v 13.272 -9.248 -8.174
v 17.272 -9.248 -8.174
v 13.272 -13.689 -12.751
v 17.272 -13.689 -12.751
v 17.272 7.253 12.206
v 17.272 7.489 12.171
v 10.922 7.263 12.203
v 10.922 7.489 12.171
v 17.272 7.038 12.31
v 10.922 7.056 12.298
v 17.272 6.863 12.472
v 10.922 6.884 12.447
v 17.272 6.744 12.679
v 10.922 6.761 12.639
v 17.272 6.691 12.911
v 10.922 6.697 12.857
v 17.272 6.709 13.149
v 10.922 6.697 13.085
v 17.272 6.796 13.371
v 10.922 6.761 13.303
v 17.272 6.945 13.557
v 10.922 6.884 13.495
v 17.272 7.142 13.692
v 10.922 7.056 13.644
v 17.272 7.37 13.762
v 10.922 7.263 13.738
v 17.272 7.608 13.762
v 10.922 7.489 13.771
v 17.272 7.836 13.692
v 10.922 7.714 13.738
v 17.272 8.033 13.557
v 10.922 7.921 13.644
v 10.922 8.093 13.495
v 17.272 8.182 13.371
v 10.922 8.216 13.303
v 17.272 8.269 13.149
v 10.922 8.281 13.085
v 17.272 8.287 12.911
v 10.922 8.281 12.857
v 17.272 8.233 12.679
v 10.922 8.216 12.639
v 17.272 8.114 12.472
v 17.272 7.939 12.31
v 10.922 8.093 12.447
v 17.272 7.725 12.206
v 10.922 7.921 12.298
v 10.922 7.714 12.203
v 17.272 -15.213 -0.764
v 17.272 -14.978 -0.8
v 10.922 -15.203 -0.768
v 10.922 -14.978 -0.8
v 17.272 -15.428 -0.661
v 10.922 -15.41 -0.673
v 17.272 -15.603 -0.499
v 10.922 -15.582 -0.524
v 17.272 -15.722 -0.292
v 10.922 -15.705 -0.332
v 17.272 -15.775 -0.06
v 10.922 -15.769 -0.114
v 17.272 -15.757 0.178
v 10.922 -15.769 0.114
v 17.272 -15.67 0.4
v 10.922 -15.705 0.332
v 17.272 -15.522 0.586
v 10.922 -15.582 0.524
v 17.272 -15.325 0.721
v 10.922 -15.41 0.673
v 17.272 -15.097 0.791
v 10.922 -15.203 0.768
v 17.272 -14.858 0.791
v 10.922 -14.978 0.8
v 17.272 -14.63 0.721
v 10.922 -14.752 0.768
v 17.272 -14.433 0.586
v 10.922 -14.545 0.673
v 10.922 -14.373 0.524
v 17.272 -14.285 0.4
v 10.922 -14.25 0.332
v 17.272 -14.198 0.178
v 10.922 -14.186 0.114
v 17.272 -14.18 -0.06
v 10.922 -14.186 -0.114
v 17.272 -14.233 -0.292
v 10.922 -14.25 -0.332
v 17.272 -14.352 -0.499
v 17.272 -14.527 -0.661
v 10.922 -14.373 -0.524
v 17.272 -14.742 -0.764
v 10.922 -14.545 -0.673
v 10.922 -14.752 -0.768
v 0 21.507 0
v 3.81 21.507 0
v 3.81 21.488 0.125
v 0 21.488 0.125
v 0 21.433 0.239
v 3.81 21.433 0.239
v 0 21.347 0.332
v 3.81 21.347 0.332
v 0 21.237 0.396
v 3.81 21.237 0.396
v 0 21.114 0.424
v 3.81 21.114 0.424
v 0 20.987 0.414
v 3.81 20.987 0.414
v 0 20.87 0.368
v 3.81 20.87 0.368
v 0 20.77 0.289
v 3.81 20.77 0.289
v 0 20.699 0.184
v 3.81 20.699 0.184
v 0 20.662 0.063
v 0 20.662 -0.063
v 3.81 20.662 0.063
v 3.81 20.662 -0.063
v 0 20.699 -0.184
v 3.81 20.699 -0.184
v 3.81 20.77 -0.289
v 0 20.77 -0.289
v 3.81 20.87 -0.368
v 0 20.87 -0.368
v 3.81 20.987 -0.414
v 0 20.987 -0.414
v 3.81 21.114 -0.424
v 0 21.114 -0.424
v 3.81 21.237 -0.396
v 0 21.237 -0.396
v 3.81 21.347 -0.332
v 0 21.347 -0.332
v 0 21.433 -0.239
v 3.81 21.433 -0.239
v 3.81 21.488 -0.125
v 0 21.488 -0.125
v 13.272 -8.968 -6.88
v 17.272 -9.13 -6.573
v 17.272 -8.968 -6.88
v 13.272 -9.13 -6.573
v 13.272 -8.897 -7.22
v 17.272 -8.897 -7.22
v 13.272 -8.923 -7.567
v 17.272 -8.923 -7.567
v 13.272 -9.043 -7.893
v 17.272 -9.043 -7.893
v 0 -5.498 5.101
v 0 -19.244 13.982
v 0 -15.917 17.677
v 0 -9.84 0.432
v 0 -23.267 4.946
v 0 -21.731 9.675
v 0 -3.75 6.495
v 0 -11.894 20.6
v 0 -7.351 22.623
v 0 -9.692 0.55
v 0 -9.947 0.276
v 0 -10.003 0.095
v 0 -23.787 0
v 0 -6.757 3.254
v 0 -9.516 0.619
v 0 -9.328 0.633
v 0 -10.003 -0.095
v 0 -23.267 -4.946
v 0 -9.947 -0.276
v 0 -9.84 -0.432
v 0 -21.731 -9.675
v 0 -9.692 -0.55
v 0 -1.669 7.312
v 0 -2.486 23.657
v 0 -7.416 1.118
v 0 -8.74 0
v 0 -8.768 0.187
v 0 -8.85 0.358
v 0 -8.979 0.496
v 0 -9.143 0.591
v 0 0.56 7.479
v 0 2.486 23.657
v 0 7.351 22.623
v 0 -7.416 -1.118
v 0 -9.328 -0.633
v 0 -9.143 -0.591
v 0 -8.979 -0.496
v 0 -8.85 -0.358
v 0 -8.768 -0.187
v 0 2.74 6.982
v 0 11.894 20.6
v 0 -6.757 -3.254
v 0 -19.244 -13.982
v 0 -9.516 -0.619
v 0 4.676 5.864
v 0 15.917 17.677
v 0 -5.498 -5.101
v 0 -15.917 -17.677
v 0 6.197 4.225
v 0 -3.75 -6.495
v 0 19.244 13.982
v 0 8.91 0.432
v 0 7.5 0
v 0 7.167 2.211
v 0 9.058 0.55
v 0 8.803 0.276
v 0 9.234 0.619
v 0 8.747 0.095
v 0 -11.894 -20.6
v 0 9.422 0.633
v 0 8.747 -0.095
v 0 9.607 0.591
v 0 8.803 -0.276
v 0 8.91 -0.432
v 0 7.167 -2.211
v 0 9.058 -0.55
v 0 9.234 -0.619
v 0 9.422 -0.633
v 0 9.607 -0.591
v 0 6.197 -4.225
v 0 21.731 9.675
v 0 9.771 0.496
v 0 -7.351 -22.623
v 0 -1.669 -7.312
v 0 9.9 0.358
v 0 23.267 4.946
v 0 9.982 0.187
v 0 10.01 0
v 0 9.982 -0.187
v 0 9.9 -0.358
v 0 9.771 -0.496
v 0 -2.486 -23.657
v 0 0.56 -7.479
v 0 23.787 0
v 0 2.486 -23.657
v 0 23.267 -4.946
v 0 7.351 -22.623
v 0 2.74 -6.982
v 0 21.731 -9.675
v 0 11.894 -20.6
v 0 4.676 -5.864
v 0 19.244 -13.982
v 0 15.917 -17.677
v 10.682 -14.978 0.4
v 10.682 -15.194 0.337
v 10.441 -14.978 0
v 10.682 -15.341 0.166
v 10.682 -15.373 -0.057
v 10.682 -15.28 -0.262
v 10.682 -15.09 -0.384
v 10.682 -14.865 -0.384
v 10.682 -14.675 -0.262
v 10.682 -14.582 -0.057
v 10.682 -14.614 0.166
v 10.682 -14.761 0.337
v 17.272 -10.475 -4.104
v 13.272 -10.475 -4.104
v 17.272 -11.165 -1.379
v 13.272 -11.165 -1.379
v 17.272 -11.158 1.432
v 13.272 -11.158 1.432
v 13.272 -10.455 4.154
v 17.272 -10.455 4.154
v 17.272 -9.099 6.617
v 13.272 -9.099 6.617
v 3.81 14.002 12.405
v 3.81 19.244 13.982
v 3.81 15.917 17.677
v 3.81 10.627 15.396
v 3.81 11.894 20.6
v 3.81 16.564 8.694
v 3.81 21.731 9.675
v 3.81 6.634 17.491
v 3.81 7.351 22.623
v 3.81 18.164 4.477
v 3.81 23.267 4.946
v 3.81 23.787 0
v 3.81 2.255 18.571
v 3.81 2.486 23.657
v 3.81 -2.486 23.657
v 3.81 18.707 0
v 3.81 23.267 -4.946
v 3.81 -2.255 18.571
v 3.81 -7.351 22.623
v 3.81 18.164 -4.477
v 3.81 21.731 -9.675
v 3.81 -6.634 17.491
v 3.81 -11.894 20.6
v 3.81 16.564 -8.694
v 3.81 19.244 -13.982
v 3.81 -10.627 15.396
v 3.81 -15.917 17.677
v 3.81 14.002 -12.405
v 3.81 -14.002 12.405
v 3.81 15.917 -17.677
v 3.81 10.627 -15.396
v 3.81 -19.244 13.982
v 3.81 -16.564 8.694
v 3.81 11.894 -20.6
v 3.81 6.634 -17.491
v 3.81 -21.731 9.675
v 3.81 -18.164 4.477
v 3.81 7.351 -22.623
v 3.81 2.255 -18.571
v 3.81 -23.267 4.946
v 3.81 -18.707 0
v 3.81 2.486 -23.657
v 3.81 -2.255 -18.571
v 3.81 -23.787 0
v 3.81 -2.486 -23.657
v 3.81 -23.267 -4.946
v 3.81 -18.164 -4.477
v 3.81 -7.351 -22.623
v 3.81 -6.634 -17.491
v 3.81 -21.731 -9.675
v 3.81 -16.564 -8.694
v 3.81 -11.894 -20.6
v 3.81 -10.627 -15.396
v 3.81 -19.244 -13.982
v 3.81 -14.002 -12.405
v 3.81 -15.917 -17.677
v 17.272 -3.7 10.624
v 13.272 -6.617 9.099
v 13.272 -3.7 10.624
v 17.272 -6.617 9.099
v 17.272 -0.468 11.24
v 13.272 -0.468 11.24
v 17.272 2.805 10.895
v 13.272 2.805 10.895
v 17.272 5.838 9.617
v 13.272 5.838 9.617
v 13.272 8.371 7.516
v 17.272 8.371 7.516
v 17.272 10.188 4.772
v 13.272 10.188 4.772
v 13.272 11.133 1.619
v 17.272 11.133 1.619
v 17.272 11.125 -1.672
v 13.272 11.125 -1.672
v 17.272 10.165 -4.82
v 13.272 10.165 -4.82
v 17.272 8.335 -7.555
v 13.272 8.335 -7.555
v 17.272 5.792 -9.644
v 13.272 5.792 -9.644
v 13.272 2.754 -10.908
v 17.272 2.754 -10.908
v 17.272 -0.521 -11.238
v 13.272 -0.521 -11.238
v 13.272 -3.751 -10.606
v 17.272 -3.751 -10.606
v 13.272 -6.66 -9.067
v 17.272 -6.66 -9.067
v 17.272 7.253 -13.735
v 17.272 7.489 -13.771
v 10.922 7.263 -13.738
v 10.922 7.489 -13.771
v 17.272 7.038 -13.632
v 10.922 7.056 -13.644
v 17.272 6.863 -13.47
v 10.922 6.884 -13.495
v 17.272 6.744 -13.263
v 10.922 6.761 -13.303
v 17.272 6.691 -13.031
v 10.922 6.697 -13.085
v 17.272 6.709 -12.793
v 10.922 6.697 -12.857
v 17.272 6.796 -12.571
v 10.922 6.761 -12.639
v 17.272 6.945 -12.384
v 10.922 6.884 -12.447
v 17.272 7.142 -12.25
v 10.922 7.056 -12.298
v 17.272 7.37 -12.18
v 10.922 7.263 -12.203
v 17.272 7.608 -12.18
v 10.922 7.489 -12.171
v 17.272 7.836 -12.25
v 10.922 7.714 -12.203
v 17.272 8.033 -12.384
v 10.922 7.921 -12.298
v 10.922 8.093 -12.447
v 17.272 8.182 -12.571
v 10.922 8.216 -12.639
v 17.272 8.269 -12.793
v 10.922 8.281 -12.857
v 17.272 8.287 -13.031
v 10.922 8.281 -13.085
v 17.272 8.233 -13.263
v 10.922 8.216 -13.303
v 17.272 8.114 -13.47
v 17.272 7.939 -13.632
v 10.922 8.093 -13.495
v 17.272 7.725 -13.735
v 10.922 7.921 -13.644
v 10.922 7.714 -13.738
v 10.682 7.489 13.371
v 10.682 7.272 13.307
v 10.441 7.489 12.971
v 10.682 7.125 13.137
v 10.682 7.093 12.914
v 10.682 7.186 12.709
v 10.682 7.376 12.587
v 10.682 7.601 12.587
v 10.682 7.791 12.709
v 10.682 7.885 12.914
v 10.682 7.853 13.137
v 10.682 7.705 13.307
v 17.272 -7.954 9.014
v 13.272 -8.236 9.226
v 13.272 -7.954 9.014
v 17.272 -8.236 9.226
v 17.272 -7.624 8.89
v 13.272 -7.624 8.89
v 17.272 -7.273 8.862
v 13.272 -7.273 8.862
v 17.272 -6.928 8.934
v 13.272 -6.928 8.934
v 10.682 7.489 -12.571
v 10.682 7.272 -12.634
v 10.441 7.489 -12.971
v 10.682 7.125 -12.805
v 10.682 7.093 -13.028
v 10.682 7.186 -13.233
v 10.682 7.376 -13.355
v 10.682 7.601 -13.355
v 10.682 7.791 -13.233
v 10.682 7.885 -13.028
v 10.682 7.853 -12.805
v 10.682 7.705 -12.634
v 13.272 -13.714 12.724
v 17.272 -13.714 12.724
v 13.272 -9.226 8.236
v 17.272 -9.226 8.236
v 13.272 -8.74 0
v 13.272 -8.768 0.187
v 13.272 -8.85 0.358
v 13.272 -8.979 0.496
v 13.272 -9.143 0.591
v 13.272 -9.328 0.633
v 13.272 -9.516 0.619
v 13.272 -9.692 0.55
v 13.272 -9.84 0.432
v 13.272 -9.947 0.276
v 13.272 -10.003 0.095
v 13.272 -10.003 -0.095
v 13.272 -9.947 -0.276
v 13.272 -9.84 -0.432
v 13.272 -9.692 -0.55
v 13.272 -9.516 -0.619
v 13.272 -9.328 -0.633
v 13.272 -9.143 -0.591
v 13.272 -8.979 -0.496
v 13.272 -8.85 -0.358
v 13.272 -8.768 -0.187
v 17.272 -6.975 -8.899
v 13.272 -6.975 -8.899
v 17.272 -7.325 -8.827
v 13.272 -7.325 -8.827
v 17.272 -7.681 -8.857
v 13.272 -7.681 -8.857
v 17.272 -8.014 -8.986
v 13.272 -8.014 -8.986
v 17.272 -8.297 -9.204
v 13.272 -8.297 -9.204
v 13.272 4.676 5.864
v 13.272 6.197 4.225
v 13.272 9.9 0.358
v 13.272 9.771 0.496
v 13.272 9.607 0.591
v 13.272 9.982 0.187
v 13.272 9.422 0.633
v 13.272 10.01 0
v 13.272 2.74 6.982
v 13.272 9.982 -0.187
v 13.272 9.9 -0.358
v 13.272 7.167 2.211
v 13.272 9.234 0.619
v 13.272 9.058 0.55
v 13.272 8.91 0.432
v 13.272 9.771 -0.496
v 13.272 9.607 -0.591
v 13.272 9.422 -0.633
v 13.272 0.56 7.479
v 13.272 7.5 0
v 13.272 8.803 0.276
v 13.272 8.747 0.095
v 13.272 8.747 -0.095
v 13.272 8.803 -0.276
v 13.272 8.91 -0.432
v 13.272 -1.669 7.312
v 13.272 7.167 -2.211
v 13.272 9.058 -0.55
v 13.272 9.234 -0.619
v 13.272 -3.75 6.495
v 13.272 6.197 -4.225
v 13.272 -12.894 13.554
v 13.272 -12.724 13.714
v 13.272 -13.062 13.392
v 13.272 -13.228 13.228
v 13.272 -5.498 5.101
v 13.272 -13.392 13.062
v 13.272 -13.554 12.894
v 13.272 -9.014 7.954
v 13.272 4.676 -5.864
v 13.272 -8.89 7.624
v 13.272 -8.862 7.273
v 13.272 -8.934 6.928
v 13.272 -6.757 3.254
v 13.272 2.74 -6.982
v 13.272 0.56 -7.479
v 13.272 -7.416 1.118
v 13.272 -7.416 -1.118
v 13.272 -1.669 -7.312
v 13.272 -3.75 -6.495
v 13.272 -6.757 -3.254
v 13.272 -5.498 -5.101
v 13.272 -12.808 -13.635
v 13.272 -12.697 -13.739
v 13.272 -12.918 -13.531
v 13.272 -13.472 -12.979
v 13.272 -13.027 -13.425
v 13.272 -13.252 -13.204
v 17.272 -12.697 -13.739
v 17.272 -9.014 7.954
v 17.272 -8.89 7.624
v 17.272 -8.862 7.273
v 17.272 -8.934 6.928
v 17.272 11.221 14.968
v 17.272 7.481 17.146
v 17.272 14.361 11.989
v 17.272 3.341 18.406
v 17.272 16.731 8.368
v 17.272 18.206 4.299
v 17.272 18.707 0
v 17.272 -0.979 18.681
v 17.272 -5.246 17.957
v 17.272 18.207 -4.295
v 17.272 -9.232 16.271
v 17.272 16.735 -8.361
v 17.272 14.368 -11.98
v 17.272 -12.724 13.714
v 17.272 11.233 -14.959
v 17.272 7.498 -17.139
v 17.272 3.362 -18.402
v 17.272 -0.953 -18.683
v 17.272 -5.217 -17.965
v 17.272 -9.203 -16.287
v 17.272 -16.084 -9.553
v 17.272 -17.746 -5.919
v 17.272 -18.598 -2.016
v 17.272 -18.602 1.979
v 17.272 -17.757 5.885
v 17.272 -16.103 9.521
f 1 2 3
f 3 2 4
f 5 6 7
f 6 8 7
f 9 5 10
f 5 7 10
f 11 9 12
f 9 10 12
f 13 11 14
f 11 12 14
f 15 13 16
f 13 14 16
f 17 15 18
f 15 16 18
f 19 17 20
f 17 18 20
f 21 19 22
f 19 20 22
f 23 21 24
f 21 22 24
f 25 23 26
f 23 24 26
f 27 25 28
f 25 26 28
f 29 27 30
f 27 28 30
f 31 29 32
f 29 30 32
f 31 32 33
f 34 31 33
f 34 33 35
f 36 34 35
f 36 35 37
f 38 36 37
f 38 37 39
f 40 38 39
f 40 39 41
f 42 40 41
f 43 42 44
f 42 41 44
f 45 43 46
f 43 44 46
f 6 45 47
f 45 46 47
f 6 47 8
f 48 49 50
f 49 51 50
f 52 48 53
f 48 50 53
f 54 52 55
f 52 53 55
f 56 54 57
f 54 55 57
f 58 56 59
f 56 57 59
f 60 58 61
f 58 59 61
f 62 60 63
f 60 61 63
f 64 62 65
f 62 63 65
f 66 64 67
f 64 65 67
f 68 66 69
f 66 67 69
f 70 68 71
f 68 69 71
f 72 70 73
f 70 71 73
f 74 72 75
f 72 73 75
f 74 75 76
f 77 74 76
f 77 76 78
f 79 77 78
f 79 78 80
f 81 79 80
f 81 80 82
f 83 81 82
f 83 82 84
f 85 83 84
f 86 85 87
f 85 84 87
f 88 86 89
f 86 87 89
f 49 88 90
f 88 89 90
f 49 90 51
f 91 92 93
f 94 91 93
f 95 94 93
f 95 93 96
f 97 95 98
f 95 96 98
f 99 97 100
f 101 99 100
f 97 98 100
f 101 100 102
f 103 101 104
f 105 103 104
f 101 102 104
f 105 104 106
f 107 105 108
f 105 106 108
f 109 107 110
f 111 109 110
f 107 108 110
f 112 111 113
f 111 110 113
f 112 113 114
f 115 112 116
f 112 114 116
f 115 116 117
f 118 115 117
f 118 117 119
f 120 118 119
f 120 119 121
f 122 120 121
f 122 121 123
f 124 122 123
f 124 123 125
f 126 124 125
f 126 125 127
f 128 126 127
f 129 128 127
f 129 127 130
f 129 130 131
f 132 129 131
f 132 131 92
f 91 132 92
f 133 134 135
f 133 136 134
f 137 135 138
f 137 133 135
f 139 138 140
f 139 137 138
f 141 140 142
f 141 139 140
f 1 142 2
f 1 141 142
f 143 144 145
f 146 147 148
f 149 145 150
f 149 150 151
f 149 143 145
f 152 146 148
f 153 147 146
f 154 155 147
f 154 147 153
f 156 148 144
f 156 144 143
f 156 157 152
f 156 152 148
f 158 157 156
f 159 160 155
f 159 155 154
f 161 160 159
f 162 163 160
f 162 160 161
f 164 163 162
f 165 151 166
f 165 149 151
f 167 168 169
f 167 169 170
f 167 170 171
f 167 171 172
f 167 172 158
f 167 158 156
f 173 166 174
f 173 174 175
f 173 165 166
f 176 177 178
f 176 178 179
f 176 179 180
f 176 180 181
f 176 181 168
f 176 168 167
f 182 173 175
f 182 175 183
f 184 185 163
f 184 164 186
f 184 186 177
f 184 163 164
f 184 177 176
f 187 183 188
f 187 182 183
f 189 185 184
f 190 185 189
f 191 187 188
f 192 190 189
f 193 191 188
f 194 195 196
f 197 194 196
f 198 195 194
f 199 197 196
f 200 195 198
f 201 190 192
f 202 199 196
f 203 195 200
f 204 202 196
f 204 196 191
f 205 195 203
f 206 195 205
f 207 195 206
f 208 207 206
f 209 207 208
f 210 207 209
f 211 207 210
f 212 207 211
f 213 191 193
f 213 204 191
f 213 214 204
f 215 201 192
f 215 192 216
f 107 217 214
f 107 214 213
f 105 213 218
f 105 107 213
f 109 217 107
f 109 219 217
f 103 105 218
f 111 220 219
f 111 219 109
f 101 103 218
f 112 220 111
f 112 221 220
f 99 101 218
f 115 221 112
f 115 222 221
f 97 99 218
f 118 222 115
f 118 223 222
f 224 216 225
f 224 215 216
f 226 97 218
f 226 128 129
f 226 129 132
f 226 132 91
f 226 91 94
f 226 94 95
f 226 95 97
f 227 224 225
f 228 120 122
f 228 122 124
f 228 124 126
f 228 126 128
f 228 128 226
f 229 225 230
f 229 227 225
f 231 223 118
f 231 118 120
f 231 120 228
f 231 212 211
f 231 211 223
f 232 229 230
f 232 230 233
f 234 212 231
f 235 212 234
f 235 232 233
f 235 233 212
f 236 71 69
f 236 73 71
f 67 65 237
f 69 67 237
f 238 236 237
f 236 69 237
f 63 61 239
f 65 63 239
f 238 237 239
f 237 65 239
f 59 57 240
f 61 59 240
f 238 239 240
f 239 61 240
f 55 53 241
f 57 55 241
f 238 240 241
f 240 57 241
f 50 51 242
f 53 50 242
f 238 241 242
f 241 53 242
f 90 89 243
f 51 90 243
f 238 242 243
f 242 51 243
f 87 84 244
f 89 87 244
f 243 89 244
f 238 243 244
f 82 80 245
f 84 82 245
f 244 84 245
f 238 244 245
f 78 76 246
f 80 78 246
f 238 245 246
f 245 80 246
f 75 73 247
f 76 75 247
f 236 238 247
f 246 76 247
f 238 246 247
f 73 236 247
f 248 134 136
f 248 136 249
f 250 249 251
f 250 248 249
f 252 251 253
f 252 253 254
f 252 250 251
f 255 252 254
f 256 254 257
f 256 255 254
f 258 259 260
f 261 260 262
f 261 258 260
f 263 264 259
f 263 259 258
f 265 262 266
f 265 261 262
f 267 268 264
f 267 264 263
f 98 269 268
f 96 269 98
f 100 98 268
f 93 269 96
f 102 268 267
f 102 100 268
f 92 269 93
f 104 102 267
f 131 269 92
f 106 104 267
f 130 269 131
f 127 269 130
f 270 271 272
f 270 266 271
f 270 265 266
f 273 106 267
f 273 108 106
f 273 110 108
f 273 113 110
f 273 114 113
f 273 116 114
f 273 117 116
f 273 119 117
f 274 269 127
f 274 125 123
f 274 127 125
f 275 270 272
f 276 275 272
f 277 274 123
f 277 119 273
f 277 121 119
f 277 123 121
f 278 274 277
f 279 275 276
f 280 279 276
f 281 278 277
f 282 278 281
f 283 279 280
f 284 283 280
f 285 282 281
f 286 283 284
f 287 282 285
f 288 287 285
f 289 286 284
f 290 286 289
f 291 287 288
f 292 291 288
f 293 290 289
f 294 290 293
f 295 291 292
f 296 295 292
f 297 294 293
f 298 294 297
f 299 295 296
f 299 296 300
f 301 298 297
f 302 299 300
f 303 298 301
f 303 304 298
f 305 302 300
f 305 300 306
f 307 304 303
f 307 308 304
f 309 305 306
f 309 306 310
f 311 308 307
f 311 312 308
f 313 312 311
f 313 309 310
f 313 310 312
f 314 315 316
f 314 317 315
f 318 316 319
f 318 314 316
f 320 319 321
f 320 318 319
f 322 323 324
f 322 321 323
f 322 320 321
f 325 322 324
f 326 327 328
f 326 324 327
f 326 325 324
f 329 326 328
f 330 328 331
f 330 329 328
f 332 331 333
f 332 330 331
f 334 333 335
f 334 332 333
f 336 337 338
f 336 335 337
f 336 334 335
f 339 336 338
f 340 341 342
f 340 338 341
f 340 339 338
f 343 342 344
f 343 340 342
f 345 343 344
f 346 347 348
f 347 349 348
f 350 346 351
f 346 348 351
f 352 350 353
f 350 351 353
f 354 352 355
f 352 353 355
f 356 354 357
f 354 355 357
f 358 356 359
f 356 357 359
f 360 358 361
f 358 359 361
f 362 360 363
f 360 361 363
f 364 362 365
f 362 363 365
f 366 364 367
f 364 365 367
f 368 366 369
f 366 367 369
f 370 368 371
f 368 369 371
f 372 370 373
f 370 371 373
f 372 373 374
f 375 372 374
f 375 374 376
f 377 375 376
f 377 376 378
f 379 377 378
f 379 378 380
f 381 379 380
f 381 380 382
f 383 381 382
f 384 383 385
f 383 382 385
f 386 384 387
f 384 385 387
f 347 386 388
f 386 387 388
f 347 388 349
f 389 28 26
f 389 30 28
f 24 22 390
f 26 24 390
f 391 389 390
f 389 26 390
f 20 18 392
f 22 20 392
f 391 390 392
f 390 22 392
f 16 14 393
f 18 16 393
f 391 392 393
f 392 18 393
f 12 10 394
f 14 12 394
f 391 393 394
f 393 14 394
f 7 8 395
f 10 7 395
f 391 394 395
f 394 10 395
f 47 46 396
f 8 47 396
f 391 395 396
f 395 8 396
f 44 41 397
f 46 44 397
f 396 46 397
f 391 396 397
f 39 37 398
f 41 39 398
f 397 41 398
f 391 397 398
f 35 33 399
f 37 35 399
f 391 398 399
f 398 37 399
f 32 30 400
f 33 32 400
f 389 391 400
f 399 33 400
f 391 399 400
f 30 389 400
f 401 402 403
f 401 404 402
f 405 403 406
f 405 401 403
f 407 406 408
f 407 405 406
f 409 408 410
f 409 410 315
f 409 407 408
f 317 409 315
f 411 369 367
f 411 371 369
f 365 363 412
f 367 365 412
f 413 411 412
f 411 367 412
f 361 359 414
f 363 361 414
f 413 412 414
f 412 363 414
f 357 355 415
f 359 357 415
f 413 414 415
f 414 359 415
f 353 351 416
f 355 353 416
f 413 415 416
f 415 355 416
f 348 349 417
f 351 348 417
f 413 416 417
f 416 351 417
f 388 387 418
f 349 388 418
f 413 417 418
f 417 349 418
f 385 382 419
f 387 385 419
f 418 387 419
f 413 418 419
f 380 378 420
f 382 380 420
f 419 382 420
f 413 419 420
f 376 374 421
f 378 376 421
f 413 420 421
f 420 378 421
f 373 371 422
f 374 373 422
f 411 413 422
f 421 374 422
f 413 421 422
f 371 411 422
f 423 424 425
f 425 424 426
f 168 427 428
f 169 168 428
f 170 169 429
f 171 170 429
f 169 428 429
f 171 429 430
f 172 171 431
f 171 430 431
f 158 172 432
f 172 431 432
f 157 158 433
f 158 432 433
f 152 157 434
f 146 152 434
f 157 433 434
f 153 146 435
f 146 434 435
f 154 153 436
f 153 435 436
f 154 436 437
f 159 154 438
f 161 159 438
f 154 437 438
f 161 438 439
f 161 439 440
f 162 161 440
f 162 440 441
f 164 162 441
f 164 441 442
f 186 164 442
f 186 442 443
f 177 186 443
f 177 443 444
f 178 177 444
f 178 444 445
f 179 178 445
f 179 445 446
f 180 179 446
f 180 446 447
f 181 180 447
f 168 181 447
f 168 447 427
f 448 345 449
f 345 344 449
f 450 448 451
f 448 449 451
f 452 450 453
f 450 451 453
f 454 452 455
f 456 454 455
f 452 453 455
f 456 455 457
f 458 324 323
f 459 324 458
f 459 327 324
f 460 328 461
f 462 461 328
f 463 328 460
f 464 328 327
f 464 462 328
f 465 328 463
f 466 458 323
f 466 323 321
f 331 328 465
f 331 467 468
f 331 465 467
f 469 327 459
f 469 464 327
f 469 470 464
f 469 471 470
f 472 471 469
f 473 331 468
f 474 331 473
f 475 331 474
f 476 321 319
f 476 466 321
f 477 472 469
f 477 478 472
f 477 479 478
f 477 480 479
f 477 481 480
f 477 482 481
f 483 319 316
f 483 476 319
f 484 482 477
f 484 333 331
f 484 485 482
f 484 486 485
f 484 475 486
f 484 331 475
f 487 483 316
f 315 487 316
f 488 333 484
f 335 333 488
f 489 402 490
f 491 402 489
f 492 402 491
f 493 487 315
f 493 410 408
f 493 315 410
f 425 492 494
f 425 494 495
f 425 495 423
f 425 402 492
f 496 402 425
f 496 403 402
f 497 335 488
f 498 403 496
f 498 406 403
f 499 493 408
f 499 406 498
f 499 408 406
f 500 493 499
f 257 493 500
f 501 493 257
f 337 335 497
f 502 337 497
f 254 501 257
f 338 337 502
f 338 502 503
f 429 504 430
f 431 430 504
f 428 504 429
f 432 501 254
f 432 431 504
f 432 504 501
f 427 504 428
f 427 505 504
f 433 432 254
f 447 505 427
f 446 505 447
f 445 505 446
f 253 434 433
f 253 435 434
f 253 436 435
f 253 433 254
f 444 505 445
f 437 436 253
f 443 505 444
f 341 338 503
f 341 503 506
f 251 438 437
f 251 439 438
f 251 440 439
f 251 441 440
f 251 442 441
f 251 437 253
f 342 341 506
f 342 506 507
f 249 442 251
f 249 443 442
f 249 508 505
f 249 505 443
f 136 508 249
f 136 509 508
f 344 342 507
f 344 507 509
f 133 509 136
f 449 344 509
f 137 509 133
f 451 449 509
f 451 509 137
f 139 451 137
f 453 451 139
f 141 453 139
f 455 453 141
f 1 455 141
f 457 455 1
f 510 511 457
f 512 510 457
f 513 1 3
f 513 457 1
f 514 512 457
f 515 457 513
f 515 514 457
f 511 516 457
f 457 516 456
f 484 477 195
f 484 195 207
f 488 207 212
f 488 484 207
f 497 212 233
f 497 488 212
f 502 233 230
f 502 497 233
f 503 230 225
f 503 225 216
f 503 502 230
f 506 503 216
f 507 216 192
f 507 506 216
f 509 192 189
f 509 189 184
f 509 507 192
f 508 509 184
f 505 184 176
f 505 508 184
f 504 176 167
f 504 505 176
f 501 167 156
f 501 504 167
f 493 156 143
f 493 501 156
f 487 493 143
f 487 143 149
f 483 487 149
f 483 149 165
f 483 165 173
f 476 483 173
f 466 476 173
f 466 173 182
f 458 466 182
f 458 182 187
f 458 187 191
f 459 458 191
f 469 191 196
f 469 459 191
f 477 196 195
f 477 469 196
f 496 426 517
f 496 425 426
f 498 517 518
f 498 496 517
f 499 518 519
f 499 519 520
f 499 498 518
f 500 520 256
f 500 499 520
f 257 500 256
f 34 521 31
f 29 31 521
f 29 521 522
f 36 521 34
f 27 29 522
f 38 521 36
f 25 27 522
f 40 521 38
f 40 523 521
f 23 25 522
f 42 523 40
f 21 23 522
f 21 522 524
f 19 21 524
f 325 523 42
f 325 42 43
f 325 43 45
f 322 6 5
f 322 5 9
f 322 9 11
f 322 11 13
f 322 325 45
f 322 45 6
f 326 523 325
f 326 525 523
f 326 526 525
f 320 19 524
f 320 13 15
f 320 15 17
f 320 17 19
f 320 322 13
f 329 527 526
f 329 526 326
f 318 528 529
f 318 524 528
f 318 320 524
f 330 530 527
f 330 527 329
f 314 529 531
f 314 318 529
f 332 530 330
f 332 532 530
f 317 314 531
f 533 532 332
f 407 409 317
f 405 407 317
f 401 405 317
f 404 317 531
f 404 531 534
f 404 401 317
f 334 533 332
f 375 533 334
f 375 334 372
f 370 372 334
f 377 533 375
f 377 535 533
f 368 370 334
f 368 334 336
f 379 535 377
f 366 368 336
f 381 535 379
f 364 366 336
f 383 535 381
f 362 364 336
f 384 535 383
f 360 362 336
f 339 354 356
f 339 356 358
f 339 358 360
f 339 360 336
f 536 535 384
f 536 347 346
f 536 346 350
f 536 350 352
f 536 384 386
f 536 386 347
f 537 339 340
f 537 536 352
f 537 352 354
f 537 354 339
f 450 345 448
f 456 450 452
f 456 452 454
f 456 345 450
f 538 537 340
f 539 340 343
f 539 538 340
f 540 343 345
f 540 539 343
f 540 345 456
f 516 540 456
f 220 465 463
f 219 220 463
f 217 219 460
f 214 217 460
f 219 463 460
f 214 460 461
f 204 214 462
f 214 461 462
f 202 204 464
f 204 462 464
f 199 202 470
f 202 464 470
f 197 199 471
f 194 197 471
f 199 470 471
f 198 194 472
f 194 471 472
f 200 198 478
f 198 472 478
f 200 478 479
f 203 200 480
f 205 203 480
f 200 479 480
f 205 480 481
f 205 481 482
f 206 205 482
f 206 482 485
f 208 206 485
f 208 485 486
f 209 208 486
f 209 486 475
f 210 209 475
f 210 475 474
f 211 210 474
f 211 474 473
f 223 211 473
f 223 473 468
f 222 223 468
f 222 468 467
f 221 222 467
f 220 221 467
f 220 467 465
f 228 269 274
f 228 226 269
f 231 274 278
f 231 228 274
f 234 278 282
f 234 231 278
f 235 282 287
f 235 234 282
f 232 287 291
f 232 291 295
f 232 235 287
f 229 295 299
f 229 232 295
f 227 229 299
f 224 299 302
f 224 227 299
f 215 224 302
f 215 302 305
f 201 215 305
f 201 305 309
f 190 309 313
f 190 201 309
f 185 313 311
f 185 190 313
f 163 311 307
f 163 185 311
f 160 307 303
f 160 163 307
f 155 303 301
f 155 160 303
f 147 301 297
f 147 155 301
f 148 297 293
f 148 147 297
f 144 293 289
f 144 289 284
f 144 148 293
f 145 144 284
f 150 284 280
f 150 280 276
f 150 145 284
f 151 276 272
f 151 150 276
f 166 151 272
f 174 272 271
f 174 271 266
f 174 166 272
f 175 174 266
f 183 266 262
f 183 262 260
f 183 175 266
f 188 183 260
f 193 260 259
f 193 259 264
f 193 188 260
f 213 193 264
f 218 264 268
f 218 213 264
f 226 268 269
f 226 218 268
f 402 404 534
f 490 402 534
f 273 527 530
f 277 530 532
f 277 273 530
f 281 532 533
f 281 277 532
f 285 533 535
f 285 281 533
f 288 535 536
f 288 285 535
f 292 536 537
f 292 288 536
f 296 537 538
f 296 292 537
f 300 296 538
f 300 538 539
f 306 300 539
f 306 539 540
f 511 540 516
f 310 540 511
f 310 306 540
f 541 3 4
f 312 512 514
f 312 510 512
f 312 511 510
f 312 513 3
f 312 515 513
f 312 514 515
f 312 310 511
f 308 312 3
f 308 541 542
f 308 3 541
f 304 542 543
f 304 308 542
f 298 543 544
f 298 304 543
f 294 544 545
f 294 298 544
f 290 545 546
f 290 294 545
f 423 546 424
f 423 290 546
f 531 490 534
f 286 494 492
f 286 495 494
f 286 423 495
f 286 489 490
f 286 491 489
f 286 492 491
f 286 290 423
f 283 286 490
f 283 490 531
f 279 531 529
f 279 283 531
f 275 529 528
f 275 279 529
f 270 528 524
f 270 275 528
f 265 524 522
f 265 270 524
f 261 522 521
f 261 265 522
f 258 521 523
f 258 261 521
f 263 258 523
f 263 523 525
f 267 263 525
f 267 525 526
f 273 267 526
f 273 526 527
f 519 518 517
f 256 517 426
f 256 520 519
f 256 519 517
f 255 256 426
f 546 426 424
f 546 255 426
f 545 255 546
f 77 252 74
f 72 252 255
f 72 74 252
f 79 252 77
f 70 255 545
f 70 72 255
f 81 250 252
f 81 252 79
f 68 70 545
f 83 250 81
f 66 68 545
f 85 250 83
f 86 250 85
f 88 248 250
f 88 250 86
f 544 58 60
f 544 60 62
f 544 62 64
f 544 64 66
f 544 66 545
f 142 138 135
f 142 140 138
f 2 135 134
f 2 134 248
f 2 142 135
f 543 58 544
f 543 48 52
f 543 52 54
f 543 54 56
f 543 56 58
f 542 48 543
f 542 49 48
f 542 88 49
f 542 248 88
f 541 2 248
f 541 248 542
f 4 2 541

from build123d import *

# Parameters (mm, degrees)
SKETCH2_R                 = 0.315
CUT_EXTRUDE1_DEPTH        = 4
SKETCH3_R                 = 0.425
CUT_EXTRUDE2_DEPTH        = 37.233654202
SKETCH4_R                 = 0.635
CUT_EXTRUDE3_DEPTH        = 37.16349315
FILLET1_R                 = 1.25
M2X0_4_TAPPED_HOLE1_D     = 1.6
M2X0_4_TAPPED_HOLE1_DEPTH = 6.35
M2X0_4_TAPPED_HOLE1_TIP   = 0.480688495


with BuildPart() as part:
    # Sketch1 → Revolve1 (revolve)
    with BuildSketch(Plane.XY):
        Polygon((0, 23.7871), (0, 7.5), (13.272, 7.5), (13.272, 11.25), (17.272, 11.25), (17.272, 18.7071), (3.81, 18.7071), (3.81, 23.7871), align=None)
    revolve(axis=Axis((13.272, 0, 0), (-1, 0, 0)))

    # Sketch2 → Cut-Extrude1 (cut)
    with BuildSketch(Plane(origin=(17.272, 0, 0), x_dir=(0, 0, -1), z_dir=(1, 0, 0))):
        with BuildLine():
            Line((-0.657808531, -0.677910665), (0, 0))
            Line((0, 0), (-0.494974747, 0.494974747))
            Line((-0.494974747, 0.494974747), (-8.434511887, -7.444562393))
            ThreePointArc((-8.434511887, -7.444562393), (-7.954951288, -7.954951288), (-7.444562393, -8.434511887))
            Line((-7.444562393, -8.434511887), (-0.16558691, -1.155536403))
            Line((-0.16558691, -1.155536403), (-0.657808531, -0.677910665))
        make_face()
        with BuildLine():
            Line((-12.723678558, -13.713628052), (-7.444562393, -8.434511887))
            ThreePointArc((-7.444562393, -8.434511887), (-7.954951288, -7.954951288), (-8.434511887, -7.444562393))
            Line((-8.434511887, -7.444562393), (-13.713628052, -12.723678558))
            ThreePointArc((-13.713628052, -12.723678558), (-13.473131789, -12.978070358), (-13.227917265, -13.227917267))
            ThreePointArc((-13.227917265, -13.227917267), (-12.978070357, -13.473131789), (-12.723678558, -13.713628052))
        make_face()
        with BuildLine():
            Line((13.738626304, -12.696682153), (8.384270986, -7.501099921))
            ThreePointArc((8.384270986, -7.501099921), (7.901171337, -8.00837009), (7.387437256, -8.484590196))
            Line((7.387437256, -8.484590196), (12.750537979, -13.688658505))
            ThreePointArc((12.750537979, -13.688658505), (13.09218126, -13.362274517), (13.425472665, -13.027366354))
            ThreePointArc((13.425472665, -13.027366354), (13.58305585, -12.862977268), (13.738626304, -12.696682153))
        make_face()
        with BuildLine():
            Line((8.384270986, -7.501099921), (0.317132147, 0.326823466))
            Line((0.317132147, 0.326823466), (0, 0))
            Line((0, 0), (0.494974747, -0.494974747))
            Line((0.494974747, -0.494974747), (-0.16558691, -1.155536403))
            Line((-0.16558691, -1.155536403), (7.387437256, -8.484590196))
            ThreePointArc((7.387437256, -8.484590196), (7.901171337, -8.00837009), (8.384270986, -7.501099921))
        make_face()
        with Locations((0, -14.9775)):
            Circle(SKETCH2_R)
        with Locations((-12.970895485, 7.48875)):
            Circle(SKETCH2_R)
        with Locations((12.970895485, 7.48875)):
            Circle(SKETCH2_R)
    extrude(amount=-CUT_EXTRUDE1_DEPTH, mode=Mode.SUBTRACT)

    # Sketch3 → Cut-Extrude2 (cut, through all)
    with BuildSketch(Plane(origin=(3.81, 0, 0), x_dir=(0, 0, -1), z_dir=(1, 0, 0))):
        with Locations(Location((0, 21.082, 0), (0, 0, 90))):
            Circle(SKETCH3_R)
    extrude(amount=-CUT_EXTRUDE2_DEPTH, mode=Mode.SUBTRACT)

    # Sketch4 → Cut-Extrude3 (cut, through all)
    with BuildSketch(Plane(origin=(13.272, 0, 0), x_dir=(0, 0, -1), z_dir=(1, 0, 0))):
        with Locations(Location((0, 9.375, 0), (0, 0, 90))):
            Circle(SKETCH4_R)
        with Locations(Location((0, -9.375, 0), (0, 0, 90))):
            Circle(SKETCH4_R)
    extrude(amount=-CUT_EXTRUDE3_DEPTH, mode=Mode.SUBTRACT)

    # Fillet1
    fillet1_edges = [part.edges().sort_by_distance(p)[0] for p in [
        (15.272, -7.444562393, 8.434511887),
        (15.272, -8.434511887, 7.444562393),
        (15.272, -7.501099921, -8.384270986),
        (15.272, -8.484590196, -7.387437256),
    ]]
    fillet(fillet1_edges, radius=FILLET1_R)

    # M2x0.4 Tapped Hole1
    with Locations(Plane(origin=(17.272, 7.48875, 12.970895485), x_dir=(0, 0, 1), z_dir=(1, 0, 0))):
        with Locations((0, 0), (-25.94179097, 0), (-12.970895485, 22.46625)):
            Hole(M2X0_4_TAPPED_HOLE1_D / 2, depth=M2X0_4_TAPPED_HOLE1_DEPTH)
            with Locations((0, 0, -(M2X0_4_TAPPED_HOLE1_DEPTH + M2X0_4_TAPPED_HOLE1_TIP / 2))):  # 118° drill point
                Cone(0, M2X0_4_TAPPED_HOLE1_D / 2, M2X0_4_TAPPED_HOLE1_TIP, mode=Mode.SUBTRACT)


solid = part.part
